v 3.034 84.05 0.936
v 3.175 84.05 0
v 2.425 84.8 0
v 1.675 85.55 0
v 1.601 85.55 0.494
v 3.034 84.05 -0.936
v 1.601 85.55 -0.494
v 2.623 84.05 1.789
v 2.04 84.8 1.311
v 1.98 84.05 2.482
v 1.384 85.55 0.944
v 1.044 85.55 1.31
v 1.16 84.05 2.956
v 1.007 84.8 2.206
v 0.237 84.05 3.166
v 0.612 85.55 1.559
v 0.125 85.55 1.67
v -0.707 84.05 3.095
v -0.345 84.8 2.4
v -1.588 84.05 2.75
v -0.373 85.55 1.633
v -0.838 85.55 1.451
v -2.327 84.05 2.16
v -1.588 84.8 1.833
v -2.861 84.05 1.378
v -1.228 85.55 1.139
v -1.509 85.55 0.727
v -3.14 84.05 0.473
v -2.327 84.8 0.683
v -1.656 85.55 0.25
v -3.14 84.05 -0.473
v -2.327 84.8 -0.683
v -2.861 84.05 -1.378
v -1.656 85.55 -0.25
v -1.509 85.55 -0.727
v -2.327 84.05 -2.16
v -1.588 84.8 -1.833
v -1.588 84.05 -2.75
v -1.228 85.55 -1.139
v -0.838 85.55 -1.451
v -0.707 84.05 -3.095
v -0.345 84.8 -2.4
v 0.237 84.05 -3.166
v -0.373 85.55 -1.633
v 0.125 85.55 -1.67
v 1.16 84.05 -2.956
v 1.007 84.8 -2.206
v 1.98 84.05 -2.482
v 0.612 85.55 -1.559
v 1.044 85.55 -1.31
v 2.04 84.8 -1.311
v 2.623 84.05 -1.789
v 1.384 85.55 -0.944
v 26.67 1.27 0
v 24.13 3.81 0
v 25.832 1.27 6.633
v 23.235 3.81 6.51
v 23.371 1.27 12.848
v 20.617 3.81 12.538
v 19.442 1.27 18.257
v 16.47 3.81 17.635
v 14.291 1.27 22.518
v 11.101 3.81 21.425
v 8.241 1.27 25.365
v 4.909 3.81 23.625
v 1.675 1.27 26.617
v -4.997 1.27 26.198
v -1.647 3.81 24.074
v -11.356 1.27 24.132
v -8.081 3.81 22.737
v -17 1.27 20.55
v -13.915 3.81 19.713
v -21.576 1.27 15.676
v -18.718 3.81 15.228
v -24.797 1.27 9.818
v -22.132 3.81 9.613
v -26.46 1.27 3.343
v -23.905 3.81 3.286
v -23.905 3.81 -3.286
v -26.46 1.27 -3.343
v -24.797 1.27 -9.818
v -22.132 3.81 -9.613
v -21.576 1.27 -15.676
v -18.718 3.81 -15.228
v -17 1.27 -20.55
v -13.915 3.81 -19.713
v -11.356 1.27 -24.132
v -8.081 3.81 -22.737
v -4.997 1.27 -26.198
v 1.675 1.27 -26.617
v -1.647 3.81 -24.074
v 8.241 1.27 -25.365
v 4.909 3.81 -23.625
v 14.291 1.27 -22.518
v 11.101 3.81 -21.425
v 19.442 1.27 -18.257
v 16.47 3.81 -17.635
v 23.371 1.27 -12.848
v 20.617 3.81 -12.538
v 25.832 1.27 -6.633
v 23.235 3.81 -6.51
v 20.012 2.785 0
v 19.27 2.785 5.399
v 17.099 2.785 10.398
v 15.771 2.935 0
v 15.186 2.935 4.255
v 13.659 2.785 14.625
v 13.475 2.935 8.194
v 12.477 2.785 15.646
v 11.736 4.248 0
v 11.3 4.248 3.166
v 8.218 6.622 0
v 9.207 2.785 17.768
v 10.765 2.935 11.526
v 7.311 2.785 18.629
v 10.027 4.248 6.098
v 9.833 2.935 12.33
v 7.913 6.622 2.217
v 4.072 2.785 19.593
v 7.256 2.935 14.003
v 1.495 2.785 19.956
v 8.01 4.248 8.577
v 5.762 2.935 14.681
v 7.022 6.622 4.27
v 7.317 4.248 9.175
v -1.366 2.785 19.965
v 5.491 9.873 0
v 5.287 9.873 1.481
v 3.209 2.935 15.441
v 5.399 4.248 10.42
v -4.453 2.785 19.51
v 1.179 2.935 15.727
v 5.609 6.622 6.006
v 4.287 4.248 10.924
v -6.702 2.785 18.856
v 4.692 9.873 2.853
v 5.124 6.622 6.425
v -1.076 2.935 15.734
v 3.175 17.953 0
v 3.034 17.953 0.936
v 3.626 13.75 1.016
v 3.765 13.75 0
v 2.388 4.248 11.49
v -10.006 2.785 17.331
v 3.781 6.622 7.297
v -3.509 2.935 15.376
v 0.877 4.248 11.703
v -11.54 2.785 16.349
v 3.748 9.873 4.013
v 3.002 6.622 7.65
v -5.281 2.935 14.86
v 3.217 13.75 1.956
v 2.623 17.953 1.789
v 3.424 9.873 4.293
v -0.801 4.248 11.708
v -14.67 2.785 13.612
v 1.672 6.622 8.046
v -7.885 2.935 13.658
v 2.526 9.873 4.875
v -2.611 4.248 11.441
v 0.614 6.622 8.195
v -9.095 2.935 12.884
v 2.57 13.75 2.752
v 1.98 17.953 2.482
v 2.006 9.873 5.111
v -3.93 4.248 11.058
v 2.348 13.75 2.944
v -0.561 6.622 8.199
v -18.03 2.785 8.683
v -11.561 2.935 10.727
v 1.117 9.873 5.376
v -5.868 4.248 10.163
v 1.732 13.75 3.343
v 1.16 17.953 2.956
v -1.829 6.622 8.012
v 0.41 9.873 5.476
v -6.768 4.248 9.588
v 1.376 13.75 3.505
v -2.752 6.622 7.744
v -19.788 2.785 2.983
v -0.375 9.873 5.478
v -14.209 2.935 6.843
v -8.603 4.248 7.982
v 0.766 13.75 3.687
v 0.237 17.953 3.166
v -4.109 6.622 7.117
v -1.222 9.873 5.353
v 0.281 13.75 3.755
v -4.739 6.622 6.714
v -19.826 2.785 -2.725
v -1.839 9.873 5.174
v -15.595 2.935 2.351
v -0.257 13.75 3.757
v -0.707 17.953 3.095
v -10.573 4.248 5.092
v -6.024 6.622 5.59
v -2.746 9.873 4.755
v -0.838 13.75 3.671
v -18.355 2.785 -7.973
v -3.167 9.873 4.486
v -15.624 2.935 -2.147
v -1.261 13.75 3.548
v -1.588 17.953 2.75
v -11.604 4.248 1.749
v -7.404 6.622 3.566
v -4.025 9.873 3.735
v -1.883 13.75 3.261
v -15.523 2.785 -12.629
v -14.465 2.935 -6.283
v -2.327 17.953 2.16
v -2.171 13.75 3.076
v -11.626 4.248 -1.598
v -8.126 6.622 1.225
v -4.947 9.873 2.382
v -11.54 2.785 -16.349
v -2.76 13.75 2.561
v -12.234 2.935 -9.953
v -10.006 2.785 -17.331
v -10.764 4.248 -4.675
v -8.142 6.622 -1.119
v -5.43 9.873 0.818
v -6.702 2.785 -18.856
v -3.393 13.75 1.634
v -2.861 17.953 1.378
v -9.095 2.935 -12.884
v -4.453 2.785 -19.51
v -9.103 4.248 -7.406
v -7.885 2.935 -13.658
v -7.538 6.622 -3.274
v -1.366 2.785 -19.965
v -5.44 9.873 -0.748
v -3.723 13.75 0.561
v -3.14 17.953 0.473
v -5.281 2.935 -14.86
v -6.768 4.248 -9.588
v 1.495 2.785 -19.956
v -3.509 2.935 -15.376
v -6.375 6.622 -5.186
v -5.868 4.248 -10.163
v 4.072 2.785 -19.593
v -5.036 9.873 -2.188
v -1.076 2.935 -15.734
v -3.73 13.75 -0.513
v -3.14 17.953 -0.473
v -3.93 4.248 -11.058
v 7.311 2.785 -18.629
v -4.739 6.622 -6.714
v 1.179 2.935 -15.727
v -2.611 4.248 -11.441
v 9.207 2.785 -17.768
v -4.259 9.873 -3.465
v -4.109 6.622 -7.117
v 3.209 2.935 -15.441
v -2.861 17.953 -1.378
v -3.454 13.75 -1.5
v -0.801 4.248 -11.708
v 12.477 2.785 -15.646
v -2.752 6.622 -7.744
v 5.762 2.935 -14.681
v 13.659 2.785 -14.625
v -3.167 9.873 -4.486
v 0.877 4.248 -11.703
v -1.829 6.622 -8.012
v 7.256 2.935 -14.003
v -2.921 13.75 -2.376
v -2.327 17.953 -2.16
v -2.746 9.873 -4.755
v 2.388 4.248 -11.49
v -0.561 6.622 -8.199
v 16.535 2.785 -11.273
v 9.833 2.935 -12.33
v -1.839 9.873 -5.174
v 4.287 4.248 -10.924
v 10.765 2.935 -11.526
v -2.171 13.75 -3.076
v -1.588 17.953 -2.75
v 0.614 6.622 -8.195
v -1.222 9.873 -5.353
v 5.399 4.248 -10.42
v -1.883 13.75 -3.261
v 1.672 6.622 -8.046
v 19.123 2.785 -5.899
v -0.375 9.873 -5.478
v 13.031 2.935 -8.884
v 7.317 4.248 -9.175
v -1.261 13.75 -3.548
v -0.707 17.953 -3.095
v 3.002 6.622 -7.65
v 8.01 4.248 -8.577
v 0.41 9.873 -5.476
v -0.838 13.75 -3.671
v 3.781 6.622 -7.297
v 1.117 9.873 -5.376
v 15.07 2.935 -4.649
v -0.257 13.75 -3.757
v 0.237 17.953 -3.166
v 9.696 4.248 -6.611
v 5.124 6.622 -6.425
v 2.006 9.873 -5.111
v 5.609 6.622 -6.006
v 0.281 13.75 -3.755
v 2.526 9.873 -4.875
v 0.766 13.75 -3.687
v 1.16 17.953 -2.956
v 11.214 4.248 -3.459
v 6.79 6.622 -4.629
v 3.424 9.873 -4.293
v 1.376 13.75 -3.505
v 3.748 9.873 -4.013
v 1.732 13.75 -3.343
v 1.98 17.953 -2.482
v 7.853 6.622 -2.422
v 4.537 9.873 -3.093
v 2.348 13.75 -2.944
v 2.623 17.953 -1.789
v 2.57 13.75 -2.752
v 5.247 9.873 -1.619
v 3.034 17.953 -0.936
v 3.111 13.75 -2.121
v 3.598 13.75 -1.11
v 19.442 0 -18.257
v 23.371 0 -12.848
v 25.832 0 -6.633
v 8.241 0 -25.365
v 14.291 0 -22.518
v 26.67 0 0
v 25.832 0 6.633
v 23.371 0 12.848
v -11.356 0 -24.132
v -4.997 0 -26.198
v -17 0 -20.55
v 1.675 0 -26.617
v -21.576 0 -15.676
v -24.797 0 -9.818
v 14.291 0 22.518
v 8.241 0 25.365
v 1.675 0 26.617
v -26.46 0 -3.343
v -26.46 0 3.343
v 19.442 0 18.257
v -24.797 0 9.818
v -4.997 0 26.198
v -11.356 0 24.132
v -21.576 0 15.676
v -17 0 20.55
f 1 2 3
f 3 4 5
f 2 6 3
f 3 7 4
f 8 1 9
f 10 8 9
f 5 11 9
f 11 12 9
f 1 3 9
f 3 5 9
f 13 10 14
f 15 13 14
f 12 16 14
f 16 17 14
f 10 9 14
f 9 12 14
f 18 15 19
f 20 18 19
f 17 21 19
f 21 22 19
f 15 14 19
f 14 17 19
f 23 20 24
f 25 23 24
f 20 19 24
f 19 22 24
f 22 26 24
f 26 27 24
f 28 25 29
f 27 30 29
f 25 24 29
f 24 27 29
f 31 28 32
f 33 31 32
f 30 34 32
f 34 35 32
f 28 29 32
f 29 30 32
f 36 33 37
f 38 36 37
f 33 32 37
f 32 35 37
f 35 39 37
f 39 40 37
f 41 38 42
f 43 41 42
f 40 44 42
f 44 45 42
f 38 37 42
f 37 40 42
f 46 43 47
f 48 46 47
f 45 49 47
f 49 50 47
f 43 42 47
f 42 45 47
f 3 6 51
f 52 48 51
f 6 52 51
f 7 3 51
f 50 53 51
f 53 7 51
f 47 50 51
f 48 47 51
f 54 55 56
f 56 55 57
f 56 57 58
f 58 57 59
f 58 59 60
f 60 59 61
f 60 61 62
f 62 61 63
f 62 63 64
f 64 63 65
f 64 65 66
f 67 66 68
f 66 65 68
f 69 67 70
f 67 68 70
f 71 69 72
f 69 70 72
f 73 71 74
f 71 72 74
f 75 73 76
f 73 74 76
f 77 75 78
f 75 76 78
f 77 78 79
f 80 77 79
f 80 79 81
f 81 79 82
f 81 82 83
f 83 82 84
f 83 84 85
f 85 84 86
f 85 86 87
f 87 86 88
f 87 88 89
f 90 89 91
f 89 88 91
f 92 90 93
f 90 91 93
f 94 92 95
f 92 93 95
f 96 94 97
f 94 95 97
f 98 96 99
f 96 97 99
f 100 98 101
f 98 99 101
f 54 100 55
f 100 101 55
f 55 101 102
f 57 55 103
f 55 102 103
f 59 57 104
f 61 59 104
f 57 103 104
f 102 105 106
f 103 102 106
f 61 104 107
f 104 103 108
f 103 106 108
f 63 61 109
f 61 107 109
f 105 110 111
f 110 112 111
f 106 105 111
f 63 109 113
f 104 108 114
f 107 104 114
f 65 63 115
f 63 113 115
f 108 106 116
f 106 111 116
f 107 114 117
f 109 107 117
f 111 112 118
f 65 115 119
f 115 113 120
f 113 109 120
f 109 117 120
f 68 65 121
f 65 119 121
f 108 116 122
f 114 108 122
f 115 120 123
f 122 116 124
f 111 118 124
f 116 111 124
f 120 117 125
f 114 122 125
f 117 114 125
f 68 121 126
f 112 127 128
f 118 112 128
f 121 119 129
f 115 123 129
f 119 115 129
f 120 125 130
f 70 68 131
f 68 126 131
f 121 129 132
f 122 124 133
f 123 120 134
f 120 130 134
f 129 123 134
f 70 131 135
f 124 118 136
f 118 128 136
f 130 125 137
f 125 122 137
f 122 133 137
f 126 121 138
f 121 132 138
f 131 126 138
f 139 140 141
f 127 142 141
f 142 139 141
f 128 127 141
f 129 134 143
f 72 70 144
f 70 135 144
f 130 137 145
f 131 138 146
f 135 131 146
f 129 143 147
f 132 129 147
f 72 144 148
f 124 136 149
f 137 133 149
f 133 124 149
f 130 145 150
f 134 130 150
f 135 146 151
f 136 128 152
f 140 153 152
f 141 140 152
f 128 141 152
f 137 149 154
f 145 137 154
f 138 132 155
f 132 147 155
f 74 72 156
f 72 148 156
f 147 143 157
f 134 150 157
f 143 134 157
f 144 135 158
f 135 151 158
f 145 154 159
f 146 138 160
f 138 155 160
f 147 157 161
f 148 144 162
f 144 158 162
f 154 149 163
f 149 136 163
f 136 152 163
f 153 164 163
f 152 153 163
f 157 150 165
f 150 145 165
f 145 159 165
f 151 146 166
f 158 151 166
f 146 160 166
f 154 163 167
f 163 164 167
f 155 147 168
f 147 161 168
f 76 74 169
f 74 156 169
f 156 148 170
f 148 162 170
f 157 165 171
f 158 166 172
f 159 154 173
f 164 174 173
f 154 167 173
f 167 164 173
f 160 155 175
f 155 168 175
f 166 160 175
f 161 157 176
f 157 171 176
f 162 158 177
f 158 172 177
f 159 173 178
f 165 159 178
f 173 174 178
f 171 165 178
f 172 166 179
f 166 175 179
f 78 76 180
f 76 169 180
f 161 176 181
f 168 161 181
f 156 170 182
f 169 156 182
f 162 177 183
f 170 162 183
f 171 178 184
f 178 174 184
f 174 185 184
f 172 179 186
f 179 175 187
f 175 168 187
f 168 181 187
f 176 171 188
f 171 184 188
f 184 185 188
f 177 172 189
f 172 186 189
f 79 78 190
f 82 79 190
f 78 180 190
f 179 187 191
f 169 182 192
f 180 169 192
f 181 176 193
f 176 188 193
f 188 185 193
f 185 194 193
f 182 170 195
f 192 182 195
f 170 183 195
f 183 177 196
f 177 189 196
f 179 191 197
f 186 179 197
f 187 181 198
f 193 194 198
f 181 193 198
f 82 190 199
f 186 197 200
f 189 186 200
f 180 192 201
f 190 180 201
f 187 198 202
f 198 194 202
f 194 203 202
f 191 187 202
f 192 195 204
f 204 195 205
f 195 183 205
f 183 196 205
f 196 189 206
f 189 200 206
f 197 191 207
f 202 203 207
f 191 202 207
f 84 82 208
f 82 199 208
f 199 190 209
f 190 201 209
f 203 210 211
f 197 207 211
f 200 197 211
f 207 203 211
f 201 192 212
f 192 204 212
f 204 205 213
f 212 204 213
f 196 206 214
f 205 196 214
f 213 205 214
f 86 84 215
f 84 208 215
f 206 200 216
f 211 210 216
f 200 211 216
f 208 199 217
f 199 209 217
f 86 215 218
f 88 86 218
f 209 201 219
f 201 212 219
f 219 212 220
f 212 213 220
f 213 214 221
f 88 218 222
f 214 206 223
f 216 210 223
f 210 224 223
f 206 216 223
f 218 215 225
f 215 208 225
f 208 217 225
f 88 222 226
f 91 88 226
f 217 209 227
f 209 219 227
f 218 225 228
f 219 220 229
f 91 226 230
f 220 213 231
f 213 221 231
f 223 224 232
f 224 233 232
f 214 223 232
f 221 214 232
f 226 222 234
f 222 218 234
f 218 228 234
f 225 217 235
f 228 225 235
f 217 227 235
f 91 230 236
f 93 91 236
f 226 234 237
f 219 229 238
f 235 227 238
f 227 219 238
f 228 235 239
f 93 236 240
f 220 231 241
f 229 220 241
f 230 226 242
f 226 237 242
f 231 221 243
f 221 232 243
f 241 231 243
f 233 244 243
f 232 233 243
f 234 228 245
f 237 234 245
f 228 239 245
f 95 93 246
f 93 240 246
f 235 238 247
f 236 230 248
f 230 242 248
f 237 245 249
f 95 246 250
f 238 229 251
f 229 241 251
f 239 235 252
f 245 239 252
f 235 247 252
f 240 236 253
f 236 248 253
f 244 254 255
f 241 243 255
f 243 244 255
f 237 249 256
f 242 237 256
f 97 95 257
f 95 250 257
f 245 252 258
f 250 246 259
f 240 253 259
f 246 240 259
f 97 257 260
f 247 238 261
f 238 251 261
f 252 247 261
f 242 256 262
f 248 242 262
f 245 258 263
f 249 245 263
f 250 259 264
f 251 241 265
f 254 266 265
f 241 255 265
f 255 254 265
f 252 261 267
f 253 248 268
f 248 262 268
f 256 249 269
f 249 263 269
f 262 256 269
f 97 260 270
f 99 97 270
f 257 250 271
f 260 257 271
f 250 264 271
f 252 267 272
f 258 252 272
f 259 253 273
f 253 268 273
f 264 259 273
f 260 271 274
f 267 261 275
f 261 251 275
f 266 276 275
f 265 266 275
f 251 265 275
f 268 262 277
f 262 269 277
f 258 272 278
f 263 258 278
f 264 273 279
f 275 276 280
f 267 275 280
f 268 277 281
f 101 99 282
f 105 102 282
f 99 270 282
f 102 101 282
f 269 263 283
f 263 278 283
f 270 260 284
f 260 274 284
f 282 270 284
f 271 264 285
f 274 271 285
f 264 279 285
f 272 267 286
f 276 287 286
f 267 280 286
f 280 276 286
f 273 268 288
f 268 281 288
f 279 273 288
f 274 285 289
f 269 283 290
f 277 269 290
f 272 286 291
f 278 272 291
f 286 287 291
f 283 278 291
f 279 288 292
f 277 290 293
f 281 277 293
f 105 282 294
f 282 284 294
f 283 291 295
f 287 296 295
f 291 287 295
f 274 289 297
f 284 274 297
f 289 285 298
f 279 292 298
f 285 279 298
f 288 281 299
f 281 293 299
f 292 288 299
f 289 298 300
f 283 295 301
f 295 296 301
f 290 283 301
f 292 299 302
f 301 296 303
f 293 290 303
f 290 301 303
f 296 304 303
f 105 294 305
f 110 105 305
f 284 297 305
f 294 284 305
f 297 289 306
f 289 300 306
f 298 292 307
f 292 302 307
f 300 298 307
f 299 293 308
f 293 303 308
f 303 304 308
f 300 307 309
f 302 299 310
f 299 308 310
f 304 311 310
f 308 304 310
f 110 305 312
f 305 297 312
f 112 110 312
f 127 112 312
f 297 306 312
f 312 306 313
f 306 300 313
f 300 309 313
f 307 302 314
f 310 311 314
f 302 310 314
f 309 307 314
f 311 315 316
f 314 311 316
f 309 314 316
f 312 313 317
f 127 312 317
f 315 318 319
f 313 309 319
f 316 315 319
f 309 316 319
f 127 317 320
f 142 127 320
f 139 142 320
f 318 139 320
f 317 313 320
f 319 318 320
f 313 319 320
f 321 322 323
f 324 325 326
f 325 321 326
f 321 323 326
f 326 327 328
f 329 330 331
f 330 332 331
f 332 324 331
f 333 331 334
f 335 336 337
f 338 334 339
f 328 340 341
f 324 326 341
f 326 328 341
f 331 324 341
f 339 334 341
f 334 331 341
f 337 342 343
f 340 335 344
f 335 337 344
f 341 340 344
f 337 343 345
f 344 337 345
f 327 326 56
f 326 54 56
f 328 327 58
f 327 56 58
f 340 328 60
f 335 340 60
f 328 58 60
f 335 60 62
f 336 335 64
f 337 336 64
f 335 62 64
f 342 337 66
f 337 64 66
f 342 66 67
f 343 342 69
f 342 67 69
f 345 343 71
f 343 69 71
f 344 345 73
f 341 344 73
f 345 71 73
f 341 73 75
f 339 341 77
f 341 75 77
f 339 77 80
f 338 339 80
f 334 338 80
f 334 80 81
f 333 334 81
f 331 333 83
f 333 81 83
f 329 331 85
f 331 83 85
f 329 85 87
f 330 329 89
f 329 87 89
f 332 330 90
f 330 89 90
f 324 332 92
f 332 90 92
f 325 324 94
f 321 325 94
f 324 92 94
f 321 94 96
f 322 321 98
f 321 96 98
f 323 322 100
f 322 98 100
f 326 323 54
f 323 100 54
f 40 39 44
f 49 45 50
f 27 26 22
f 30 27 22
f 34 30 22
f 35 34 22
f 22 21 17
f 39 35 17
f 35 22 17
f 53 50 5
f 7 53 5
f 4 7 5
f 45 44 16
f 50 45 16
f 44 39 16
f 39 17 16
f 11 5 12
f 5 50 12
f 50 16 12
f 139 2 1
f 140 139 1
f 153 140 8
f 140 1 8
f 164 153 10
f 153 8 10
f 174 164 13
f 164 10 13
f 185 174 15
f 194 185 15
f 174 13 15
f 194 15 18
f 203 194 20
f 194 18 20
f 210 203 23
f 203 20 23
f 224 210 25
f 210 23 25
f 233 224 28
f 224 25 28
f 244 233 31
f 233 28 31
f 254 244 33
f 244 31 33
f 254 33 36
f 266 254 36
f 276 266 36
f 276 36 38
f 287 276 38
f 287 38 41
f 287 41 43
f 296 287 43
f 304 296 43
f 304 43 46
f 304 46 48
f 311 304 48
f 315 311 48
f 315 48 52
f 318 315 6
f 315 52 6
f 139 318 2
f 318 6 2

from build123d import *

# Parameters (mm, degrees)
CHAMFER1_SIZE = 1.5


with BuildPart() as part:
    # Sketch2 → Revolve1 (revolve)
    with BuildSketch(Plane.XY):
        with BuildLine():
            Line((0, 0), (26.67, 0))
            Line((26.67, 0), (26.67, 1.27))
            Line((26.67, 1.27), (24.13, 3.81))
            ThreePointArc((24.13, 3.81), (9.893843865, 5.312197185), (3.175, 17.952682737))
            Line((3.175, 17.952682737), (3.175, 85.55))
            Line((3.175, 85.55), (0, 85.55))
            Line((0, 85.55), (0, 0))
        make_face()
    revolve(axis=Axis((0, 85.55, 0), (0, -1, 0)))

    # Chamfer1
    chamfer1_edges = [part.edges().sort_by_distance(p)[0] for p in [
        (-3.175, 85.55, 0),
    ]]
    chamfer(chamfer1_edges, length=CHAMFER1_SIZE)


solid = part.part
